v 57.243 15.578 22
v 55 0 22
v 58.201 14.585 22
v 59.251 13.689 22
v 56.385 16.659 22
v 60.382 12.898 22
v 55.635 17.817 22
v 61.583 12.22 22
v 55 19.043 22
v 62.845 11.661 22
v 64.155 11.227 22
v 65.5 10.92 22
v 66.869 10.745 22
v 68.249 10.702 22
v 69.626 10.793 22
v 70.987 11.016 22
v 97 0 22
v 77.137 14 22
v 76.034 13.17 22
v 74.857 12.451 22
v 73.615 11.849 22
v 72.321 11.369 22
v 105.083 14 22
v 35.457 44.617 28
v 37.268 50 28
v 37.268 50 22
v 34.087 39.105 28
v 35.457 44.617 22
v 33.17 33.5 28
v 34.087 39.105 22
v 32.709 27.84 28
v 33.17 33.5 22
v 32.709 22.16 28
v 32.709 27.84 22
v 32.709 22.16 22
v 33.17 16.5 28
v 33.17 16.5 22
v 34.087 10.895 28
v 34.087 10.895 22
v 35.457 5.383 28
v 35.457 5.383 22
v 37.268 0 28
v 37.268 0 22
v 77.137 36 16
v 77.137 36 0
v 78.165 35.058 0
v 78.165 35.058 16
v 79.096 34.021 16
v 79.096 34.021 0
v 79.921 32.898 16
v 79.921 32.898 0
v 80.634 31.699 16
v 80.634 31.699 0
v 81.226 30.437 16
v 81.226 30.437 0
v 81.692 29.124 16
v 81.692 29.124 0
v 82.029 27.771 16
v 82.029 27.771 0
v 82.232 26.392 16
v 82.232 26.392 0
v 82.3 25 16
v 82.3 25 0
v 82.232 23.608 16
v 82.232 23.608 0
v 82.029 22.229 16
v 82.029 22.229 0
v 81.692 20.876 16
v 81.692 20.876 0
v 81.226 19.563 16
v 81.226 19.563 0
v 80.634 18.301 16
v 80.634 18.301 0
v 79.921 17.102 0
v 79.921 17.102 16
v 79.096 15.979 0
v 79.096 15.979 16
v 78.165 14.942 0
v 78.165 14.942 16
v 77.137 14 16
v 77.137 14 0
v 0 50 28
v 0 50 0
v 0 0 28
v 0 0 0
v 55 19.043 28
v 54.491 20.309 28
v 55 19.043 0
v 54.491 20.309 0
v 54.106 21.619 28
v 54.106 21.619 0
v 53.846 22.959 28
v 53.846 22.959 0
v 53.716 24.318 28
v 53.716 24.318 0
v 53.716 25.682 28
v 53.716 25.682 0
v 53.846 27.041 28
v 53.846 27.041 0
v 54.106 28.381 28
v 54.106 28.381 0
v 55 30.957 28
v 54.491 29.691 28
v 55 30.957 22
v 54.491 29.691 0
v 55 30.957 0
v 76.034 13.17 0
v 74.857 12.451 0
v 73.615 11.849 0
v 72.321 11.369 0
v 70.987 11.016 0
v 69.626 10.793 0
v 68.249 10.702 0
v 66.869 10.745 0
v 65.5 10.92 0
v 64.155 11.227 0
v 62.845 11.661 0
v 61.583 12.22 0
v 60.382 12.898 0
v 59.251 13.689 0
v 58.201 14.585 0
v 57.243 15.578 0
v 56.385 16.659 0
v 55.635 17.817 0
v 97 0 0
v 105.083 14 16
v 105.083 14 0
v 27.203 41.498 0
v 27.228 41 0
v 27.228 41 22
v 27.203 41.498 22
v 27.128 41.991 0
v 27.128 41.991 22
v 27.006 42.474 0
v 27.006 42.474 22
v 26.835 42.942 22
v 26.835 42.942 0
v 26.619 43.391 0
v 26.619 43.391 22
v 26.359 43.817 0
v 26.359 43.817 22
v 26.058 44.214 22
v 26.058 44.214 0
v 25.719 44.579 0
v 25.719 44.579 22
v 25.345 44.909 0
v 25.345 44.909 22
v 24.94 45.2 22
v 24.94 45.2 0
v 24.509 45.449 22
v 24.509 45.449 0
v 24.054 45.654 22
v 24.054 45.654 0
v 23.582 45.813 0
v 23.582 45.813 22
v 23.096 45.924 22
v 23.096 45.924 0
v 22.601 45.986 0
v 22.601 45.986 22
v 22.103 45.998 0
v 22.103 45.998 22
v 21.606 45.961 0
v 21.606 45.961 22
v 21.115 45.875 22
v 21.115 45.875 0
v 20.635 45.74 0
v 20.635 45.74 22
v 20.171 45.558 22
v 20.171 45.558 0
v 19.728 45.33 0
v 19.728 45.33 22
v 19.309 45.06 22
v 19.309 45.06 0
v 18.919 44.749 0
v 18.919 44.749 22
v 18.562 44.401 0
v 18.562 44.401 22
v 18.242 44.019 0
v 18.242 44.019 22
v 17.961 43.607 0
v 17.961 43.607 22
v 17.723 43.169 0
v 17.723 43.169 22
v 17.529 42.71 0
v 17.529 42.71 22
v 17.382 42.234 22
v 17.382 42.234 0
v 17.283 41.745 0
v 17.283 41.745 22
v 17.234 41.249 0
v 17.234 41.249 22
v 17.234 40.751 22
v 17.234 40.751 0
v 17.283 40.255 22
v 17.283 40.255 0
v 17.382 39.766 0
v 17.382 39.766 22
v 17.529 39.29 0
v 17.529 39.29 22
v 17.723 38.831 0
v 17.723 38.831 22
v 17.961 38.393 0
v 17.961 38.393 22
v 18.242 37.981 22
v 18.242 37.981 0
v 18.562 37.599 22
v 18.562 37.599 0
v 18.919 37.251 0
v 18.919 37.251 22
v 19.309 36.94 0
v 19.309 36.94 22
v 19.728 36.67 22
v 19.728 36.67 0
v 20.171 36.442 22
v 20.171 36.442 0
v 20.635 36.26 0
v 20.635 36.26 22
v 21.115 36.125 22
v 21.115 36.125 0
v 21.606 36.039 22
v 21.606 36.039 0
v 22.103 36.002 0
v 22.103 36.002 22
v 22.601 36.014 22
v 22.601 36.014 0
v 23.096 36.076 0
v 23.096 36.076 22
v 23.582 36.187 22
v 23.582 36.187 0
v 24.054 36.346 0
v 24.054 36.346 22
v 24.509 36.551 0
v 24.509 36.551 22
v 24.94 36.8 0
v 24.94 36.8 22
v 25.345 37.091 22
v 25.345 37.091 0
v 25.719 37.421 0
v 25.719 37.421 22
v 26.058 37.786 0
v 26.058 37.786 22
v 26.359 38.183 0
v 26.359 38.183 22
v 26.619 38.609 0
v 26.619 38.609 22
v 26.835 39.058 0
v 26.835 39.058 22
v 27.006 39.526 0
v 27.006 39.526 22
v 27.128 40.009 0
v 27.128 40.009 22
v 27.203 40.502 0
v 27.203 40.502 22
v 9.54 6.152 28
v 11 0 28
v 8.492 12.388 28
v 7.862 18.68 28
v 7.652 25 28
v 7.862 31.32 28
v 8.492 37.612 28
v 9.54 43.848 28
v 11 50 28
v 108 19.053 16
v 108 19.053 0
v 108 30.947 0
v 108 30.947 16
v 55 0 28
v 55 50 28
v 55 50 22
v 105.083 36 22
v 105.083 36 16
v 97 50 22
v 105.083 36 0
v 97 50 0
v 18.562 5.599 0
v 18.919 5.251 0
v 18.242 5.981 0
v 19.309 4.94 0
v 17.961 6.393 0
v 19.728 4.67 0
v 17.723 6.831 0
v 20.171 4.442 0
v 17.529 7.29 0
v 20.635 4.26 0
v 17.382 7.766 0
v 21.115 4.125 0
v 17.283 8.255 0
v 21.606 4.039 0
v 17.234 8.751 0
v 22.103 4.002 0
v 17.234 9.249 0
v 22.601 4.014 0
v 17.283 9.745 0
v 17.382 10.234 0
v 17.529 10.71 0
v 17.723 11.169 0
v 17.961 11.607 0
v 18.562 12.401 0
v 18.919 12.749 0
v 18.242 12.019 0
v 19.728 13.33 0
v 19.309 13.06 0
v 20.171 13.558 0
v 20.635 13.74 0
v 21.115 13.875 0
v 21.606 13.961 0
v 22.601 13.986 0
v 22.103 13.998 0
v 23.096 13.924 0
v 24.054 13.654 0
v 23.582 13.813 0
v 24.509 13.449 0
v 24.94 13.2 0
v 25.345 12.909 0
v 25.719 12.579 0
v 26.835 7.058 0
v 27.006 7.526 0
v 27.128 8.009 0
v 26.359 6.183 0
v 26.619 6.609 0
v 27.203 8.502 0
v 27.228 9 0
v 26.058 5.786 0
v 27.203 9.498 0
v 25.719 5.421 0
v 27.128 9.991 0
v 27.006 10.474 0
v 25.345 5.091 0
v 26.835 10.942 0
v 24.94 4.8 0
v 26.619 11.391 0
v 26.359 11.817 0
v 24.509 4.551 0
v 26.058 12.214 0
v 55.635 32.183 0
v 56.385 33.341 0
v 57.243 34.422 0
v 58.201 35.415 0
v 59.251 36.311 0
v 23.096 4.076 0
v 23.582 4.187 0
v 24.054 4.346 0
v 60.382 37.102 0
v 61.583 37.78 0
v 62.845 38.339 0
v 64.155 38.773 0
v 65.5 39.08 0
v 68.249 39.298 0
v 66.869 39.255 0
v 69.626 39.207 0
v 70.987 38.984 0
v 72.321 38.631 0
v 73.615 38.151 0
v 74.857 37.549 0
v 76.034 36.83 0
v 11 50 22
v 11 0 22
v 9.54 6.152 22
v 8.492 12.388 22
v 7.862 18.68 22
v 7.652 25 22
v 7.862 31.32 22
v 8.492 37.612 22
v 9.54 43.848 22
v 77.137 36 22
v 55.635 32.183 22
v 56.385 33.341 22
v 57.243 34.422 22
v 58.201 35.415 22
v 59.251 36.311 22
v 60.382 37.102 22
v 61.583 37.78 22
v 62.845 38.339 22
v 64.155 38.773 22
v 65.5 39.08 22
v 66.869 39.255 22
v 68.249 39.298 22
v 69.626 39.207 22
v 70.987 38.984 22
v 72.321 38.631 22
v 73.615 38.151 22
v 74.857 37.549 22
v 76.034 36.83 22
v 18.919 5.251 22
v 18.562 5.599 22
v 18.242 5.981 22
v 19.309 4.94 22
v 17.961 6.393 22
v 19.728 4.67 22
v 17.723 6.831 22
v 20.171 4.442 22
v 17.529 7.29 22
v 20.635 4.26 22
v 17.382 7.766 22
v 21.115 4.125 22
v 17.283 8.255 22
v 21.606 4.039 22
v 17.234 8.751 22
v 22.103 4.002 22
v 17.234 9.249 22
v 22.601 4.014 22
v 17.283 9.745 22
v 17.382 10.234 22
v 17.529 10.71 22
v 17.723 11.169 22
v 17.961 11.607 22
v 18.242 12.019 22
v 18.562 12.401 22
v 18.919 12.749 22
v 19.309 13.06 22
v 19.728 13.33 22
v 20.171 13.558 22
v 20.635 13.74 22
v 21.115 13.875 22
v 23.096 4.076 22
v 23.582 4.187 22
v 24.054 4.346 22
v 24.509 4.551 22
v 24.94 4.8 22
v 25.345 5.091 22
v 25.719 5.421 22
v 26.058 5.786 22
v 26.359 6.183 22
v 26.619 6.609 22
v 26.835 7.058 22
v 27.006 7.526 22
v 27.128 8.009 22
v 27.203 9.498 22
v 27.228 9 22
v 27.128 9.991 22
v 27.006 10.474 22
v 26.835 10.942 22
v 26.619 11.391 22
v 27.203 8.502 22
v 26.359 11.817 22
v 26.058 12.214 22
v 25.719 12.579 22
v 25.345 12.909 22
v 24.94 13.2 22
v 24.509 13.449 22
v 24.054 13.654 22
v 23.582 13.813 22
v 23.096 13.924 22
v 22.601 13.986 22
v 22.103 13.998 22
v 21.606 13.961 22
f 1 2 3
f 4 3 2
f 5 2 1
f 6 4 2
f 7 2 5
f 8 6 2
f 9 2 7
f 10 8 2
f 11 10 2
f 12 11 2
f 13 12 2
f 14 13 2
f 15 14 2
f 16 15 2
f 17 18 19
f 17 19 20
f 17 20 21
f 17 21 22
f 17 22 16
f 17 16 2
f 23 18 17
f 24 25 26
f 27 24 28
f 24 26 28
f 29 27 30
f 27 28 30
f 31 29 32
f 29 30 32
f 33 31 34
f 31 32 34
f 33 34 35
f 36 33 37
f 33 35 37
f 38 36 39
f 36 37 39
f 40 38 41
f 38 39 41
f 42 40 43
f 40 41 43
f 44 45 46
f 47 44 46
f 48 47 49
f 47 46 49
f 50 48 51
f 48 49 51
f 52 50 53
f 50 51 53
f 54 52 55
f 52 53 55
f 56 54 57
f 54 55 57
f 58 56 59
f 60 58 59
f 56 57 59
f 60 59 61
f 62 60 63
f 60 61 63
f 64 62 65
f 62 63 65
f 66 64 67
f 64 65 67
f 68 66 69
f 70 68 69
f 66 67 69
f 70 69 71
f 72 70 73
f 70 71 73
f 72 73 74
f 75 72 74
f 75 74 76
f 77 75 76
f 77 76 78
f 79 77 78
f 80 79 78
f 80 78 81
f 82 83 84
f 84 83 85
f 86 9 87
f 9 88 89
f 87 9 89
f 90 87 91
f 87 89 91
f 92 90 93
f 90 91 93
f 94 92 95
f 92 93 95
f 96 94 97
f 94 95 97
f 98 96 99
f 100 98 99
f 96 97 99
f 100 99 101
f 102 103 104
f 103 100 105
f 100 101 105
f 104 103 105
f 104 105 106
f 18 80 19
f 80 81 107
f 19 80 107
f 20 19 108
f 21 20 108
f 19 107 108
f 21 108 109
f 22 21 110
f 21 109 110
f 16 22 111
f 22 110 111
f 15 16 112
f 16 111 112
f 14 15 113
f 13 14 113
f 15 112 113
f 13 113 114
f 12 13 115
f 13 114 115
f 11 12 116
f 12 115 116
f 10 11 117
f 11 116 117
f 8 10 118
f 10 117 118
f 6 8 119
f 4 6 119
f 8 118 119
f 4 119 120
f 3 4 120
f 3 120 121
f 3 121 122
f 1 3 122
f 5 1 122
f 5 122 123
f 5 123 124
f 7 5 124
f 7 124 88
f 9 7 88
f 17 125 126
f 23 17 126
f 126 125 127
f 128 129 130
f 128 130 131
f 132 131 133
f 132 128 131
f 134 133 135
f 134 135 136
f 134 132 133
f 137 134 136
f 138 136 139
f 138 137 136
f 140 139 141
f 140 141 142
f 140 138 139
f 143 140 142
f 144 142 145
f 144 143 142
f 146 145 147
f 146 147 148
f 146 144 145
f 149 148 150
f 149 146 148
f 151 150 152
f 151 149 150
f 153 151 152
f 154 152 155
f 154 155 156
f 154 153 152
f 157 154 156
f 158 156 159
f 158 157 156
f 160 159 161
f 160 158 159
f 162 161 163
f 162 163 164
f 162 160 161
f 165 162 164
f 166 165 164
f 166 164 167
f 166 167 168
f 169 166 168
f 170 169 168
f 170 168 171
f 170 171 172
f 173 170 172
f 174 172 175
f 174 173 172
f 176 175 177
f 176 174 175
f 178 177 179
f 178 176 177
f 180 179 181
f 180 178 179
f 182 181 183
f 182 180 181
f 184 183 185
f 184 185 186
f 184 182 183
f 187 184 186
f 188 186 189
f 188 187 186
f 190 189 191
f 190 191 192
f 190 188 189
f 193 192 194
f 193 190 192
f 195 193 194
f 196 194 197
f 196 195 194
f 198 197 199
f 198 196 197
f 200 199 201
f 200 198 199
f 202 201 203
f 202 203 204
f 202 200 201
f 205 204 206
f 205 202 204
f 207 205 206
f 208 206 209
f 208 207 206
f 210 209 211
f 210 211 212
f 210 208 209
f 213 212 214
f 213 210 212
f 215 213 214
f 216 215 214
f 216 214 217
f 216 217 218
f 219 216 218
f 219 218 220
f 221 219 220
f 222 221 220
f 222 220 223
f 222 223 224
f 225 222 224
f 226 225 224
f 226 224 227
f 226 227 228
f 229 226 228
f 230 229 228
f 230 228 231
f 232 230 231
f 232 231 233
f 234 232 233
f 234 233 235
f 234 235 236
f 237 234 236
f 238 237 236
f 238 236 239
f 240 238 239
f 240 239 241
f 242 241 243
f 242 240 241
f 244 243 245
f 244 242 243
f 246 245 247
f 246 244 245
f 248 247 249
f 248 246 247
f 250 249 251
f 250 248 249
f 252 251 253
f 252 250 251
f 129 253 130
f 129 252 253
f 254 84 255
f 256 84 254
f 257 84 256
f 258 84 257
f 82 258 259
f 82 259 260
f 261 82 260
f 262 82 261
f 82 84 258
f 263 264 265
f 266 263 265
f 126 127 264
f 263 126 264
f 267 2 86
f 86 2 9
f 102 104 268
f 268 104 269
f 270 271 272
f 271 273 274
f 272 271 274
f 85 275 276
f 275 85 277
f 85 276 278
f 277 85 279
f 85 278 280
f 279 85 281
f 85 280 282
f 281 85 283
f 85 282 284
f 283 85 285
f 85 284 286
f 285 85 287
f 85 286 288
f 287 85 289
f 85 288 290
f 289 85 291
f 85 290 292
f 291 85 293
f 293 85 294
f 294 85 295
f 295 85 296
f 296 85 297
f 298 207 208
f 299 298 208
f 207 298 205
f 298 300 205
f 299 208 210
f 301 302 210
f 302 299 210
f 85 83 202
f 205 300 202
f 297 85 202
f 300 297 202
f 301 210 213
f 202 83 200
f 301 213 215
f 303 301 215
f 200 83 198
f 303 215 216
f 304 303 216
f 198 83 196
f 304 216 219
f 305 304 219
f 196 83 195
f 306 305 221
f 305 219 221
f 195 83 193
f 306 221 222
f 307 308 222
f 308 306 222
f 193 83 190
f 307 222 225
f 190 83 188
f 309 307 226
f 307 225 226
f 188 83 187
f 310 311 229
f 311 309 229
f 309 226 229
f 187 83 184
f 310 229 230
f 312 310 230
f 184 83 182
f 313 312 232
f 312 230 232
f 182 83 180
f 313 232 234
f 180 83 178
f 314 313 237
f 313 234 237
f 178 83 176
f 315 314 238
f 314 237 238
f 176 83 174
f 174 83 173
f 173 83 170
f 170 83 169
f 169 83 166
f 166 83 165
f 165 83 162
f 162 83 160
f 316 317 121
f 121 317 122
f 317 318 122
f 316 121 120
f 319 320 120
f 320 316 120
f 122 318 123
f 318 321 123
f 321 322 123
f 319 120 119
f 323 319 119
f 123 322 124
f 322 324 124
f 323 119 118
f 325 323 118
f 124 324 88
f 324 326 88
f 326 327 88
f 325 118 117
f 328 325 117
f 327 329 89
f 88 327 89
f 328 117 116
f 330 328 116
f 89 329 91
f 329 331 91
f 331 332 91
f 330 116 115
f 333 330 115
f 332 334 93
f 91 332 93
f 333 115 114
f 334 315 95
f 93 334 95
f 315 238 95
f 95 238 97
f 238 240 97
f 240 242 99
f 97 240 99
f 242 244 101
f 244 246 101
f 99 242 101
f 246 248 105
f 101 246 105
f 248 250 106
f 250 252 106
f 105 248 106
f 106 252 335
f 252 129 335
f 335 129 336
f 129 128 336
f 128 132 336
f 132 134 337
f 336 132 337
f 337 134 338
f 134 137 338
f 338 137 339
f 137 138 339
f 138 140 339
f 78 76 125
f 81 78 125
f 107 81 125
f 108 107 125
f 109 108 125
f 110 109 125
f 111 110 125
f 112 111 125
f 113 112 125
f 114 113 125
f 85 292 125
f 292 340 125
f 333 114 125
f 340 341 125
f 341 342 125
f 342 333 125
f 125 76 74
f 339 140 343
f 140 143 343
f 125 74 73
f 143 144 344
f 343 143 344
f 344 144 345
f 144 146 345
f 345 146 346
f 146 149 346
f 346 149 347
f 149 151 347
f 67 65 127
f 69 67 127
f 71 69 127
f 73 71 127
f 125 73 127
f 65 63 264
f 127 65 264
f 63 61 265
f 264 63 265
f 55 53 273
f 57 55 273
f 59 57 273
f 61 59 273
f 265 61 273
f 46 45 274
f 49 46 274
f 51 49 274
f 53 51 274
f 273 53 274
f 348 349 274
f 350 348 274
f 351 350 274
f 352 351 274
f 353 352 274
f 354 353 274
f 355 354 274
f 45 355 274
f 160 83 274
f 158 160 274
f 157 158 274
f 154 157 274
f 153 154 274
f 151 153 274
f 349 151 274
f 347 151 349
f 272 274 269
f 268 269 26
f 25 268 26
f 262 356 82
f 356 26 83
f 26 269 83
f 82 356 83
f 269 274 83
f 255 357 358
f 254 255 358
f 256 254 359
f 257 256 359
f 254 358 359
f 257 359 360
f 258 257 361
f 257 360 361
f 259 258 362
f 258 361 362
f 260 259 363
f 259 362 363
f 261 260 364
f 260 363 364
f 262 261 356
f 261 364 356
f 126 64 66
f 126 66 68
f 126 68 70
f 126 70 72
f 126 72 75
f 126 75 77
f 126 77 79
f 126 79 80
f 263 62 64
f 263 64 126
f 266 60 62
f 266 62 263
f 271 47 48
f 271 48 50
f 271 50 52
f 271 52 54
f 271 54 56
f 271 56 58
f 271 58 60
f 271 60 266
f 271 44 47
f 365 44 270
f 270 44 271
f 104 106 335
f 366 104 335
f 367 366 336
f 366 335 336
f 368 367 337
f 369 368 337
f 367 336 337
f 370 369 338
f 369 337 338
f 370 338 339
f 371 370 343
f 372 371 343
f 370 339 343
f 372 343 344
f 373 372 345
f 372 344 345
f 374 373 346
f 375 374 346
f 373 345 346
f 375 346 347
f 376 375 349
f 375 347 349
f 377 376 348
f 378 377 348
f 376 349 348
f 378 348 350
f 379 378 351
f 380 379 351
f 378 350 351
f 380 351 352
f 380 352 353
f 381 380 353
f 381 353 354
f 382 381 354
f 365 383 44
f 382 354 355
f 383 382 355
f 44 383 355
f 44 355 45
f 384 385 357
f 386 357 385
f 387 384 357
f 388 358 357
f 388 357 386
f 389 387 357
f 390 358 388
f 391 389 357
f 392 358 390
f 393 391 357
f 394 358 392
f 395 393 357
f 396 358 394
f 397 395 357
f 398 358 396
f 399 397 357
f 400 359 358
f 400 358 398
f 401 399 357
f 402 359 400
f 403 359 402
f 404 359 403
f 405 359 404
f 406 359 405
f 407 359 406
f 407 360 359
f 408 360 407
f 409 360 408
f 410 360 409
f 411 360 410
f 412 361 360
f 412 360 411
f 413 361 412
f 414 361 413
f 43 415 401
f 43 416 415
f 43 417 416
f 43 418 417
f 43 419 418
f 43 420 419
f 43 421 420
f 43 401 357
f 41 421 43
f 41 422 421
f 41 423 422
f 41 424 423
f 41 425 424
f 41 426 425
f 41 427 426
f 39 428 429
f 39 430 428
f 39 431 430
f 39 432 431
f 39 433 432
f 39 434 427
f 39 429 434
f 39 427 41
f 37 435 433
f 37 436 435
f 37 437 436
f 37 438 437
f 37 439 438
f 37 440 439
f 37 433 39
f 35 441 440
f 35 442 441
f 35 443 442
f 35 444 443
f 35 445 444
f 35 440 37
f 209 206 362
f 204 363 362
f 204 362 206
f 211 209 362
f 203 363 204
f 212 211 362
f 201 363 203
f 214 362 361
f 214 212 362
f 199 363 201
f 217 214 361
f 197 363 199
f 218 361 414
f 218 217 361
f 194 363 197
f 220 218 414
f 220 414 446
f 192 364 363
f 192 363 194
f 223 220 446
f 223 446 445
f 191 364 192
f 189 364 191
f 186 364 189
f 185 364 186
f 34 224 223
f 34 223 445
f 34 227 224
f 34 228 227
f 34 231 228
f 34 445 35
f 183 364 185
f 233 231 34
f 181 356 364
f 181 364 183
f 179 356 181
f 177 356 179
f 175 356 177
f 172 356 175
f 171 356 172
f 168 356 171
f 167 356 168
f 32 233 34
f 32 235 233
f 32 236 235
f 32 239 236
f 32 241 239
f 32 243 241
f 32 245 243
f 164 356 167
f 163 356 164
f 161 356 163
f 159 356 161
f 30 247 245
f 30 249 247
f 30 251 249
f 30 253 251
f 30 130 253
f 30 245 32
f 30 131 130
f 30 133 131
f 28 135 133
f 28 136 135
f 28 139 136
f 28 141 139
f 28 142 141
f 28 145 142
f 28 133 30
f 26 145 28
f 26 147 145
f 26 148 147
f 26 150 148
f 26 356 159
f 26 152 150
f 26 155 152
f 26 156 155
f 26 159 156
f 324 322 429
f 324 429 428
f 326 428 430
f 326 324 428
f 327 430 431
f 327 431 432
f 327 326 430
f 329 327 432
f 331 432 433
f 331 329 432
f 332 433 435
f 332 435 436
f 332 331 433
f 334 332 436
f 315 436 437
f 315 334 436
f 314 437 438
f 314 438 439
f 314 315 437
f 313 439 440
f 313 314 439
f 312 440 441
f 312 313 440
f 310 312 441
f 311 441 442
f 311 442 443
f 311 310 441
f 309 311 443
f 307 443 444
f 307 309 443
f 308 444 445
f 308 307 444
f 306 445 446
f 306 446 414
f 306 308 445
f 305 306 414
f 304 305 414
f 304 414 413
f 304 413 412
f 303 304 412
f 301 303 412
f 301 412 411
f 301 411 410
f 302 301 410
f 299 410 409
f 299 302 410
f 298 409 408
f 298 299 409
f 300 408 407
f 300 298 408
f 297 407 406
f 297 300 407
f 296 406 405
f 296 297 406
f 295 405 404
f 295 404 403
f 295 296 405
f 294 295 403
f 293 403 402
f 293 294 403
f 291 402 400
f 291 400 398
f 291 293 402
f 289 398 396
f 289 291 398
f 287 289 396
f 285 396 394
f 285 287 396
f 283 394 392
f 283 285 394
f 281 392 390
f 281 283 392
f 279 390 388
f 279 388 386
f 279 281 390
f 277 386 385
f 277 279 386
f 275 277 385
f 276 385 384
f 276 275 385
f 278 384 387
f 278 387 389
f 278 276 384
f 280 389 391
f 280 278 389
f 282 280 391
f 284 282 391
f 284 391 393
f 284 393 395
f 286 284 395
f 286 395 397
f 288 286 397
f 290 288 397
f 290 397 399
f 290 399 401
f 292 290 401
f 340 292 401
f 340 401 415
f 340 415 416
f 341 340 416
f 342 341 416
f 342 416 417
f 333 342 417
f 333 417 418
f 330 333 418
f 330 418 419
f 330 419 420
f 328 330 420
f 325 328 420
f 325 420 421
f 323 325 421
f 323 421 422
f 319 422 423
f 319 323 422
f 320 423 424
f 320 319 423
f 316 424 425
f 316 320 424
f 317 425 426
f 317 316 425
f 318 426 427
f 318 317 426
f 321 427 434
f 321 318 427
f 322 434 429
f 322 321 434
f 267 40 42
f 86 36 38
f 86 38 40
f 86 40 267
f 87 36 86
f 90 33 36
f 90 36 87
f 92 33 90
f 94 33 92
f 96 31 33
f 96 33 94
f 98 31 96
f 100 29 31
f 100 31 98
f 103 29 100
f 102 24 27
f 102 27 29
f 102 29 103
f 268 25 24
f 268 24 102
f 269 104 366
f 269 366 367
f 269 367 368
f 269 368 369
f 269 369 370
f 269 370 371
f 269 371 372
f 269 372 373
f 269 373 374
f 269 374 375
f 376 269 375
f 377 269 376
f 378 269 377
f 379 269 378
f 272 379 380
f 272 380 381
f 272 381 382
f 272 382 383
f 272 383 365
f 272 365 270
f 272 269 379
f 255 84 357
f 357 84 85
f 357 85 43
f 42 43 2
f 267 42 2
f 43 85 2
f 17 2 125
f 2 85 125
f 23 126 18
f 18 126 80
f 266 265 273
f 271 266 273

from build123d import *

# Parameters (mm, degrees)
F0_R     = 5
F1_DEPTH = 22
F2_DEPTH = 28
F3_DEPTH = 22
F4_DEPTH = 16


with BuildPart() as f1:
    # F0 (on Top) → F1 (new body)
    with BuildSketch(Plane.XY):
        with BuildLine():
            ThreePointArc((11, 50), (7.651514, 25), (11, 0))
            Line((11, 0), (37.26803, 0))
            ThreePointArc((37.26803, 0), (32.651514, 25), (37.26803, 50))
            Line((37.26803, 50), (11, 50))
        make_face()
        with Locations((22.227637, 9)):
            Circle(F0_R, mode=Mode.SUBTRACT)
        with Locations((22.227637, 41)):
            Circle(F0_R, mode=Mode.SUBTRACT)
    extrude(amount=F1_DEPTH)

    # F0 (on Top) → F2 (join)
    with BuildSketch(Plane.XY):
        with BuildLine():
            Line((0, 50), (0, 0))
            Line((0, 0), (11, 0))
            ThreePointArc((11, 0), (7.651514, 25), (11, 50))
            Line((11, 50), (0, 50))
        make_face()
        with BuildLine():
            ThreePointArc((37.26803, 50), (32.651514, 25), (37.26803, 0))
            Line((37.26803, 0), (55, 0))
            Line((55, 0), (55, 19.042652))
            ThreePointArc((55, 19.042652), (53.7, 25), (55, 30.957348))
            Line((55, 30.957348), (55, 50))
            Line((55, 50), (37.26803, 50))
        make_face()
    extrude(amount=F2_DEPTH)

    # F0 (on Top) → F3 (join)
    with BuildSketch(Plane.XY):
        with BuildLine():
            Line((97, 50), (55, 50))
            Line((55, 50), (55, 30.957348))
            ThreePointArc((55, 30.957348), (64.823961, 38.94284), (77.137286, 36))
            Line((77.137286, 36), (105.082904, 36))
            Line((105.082904, 36), (97, 50))
        make_face()
        with BuildLine():
            Line((55, 19.042652), (55, 0))
            Line((55, 0), (97, 0))
            Line((97, 0), (105.082904, 14))
            Line((105.082904, 14), (77.137286, 14))
            ThreePointArc((77.137286, 14), (64.823961, 11.05716), (55, 19.042652))
        make_face()
    extrude(amount=F3_DEPTH)

    # F0 (on Top) → F4 (join)
    with BuildSketch(Plane.XY):
        with BuildLine():
            ThreePointArc((77.137286, 36), (82.3, 25), (77.137286, 14))
            Line((77.137286, 14), (105.082904, 14))
            Line((105.082904, 14), (108, 19.052559))
            Line((108, 19.052559), (108, 30.947441))
            Line((108, 30.947441), (105.082904, 36))
            Line((105.082904, 36), (77.137286, 36))
        make_face()
    extrude(amount=F4_DEPTH)


solid = f1.part
